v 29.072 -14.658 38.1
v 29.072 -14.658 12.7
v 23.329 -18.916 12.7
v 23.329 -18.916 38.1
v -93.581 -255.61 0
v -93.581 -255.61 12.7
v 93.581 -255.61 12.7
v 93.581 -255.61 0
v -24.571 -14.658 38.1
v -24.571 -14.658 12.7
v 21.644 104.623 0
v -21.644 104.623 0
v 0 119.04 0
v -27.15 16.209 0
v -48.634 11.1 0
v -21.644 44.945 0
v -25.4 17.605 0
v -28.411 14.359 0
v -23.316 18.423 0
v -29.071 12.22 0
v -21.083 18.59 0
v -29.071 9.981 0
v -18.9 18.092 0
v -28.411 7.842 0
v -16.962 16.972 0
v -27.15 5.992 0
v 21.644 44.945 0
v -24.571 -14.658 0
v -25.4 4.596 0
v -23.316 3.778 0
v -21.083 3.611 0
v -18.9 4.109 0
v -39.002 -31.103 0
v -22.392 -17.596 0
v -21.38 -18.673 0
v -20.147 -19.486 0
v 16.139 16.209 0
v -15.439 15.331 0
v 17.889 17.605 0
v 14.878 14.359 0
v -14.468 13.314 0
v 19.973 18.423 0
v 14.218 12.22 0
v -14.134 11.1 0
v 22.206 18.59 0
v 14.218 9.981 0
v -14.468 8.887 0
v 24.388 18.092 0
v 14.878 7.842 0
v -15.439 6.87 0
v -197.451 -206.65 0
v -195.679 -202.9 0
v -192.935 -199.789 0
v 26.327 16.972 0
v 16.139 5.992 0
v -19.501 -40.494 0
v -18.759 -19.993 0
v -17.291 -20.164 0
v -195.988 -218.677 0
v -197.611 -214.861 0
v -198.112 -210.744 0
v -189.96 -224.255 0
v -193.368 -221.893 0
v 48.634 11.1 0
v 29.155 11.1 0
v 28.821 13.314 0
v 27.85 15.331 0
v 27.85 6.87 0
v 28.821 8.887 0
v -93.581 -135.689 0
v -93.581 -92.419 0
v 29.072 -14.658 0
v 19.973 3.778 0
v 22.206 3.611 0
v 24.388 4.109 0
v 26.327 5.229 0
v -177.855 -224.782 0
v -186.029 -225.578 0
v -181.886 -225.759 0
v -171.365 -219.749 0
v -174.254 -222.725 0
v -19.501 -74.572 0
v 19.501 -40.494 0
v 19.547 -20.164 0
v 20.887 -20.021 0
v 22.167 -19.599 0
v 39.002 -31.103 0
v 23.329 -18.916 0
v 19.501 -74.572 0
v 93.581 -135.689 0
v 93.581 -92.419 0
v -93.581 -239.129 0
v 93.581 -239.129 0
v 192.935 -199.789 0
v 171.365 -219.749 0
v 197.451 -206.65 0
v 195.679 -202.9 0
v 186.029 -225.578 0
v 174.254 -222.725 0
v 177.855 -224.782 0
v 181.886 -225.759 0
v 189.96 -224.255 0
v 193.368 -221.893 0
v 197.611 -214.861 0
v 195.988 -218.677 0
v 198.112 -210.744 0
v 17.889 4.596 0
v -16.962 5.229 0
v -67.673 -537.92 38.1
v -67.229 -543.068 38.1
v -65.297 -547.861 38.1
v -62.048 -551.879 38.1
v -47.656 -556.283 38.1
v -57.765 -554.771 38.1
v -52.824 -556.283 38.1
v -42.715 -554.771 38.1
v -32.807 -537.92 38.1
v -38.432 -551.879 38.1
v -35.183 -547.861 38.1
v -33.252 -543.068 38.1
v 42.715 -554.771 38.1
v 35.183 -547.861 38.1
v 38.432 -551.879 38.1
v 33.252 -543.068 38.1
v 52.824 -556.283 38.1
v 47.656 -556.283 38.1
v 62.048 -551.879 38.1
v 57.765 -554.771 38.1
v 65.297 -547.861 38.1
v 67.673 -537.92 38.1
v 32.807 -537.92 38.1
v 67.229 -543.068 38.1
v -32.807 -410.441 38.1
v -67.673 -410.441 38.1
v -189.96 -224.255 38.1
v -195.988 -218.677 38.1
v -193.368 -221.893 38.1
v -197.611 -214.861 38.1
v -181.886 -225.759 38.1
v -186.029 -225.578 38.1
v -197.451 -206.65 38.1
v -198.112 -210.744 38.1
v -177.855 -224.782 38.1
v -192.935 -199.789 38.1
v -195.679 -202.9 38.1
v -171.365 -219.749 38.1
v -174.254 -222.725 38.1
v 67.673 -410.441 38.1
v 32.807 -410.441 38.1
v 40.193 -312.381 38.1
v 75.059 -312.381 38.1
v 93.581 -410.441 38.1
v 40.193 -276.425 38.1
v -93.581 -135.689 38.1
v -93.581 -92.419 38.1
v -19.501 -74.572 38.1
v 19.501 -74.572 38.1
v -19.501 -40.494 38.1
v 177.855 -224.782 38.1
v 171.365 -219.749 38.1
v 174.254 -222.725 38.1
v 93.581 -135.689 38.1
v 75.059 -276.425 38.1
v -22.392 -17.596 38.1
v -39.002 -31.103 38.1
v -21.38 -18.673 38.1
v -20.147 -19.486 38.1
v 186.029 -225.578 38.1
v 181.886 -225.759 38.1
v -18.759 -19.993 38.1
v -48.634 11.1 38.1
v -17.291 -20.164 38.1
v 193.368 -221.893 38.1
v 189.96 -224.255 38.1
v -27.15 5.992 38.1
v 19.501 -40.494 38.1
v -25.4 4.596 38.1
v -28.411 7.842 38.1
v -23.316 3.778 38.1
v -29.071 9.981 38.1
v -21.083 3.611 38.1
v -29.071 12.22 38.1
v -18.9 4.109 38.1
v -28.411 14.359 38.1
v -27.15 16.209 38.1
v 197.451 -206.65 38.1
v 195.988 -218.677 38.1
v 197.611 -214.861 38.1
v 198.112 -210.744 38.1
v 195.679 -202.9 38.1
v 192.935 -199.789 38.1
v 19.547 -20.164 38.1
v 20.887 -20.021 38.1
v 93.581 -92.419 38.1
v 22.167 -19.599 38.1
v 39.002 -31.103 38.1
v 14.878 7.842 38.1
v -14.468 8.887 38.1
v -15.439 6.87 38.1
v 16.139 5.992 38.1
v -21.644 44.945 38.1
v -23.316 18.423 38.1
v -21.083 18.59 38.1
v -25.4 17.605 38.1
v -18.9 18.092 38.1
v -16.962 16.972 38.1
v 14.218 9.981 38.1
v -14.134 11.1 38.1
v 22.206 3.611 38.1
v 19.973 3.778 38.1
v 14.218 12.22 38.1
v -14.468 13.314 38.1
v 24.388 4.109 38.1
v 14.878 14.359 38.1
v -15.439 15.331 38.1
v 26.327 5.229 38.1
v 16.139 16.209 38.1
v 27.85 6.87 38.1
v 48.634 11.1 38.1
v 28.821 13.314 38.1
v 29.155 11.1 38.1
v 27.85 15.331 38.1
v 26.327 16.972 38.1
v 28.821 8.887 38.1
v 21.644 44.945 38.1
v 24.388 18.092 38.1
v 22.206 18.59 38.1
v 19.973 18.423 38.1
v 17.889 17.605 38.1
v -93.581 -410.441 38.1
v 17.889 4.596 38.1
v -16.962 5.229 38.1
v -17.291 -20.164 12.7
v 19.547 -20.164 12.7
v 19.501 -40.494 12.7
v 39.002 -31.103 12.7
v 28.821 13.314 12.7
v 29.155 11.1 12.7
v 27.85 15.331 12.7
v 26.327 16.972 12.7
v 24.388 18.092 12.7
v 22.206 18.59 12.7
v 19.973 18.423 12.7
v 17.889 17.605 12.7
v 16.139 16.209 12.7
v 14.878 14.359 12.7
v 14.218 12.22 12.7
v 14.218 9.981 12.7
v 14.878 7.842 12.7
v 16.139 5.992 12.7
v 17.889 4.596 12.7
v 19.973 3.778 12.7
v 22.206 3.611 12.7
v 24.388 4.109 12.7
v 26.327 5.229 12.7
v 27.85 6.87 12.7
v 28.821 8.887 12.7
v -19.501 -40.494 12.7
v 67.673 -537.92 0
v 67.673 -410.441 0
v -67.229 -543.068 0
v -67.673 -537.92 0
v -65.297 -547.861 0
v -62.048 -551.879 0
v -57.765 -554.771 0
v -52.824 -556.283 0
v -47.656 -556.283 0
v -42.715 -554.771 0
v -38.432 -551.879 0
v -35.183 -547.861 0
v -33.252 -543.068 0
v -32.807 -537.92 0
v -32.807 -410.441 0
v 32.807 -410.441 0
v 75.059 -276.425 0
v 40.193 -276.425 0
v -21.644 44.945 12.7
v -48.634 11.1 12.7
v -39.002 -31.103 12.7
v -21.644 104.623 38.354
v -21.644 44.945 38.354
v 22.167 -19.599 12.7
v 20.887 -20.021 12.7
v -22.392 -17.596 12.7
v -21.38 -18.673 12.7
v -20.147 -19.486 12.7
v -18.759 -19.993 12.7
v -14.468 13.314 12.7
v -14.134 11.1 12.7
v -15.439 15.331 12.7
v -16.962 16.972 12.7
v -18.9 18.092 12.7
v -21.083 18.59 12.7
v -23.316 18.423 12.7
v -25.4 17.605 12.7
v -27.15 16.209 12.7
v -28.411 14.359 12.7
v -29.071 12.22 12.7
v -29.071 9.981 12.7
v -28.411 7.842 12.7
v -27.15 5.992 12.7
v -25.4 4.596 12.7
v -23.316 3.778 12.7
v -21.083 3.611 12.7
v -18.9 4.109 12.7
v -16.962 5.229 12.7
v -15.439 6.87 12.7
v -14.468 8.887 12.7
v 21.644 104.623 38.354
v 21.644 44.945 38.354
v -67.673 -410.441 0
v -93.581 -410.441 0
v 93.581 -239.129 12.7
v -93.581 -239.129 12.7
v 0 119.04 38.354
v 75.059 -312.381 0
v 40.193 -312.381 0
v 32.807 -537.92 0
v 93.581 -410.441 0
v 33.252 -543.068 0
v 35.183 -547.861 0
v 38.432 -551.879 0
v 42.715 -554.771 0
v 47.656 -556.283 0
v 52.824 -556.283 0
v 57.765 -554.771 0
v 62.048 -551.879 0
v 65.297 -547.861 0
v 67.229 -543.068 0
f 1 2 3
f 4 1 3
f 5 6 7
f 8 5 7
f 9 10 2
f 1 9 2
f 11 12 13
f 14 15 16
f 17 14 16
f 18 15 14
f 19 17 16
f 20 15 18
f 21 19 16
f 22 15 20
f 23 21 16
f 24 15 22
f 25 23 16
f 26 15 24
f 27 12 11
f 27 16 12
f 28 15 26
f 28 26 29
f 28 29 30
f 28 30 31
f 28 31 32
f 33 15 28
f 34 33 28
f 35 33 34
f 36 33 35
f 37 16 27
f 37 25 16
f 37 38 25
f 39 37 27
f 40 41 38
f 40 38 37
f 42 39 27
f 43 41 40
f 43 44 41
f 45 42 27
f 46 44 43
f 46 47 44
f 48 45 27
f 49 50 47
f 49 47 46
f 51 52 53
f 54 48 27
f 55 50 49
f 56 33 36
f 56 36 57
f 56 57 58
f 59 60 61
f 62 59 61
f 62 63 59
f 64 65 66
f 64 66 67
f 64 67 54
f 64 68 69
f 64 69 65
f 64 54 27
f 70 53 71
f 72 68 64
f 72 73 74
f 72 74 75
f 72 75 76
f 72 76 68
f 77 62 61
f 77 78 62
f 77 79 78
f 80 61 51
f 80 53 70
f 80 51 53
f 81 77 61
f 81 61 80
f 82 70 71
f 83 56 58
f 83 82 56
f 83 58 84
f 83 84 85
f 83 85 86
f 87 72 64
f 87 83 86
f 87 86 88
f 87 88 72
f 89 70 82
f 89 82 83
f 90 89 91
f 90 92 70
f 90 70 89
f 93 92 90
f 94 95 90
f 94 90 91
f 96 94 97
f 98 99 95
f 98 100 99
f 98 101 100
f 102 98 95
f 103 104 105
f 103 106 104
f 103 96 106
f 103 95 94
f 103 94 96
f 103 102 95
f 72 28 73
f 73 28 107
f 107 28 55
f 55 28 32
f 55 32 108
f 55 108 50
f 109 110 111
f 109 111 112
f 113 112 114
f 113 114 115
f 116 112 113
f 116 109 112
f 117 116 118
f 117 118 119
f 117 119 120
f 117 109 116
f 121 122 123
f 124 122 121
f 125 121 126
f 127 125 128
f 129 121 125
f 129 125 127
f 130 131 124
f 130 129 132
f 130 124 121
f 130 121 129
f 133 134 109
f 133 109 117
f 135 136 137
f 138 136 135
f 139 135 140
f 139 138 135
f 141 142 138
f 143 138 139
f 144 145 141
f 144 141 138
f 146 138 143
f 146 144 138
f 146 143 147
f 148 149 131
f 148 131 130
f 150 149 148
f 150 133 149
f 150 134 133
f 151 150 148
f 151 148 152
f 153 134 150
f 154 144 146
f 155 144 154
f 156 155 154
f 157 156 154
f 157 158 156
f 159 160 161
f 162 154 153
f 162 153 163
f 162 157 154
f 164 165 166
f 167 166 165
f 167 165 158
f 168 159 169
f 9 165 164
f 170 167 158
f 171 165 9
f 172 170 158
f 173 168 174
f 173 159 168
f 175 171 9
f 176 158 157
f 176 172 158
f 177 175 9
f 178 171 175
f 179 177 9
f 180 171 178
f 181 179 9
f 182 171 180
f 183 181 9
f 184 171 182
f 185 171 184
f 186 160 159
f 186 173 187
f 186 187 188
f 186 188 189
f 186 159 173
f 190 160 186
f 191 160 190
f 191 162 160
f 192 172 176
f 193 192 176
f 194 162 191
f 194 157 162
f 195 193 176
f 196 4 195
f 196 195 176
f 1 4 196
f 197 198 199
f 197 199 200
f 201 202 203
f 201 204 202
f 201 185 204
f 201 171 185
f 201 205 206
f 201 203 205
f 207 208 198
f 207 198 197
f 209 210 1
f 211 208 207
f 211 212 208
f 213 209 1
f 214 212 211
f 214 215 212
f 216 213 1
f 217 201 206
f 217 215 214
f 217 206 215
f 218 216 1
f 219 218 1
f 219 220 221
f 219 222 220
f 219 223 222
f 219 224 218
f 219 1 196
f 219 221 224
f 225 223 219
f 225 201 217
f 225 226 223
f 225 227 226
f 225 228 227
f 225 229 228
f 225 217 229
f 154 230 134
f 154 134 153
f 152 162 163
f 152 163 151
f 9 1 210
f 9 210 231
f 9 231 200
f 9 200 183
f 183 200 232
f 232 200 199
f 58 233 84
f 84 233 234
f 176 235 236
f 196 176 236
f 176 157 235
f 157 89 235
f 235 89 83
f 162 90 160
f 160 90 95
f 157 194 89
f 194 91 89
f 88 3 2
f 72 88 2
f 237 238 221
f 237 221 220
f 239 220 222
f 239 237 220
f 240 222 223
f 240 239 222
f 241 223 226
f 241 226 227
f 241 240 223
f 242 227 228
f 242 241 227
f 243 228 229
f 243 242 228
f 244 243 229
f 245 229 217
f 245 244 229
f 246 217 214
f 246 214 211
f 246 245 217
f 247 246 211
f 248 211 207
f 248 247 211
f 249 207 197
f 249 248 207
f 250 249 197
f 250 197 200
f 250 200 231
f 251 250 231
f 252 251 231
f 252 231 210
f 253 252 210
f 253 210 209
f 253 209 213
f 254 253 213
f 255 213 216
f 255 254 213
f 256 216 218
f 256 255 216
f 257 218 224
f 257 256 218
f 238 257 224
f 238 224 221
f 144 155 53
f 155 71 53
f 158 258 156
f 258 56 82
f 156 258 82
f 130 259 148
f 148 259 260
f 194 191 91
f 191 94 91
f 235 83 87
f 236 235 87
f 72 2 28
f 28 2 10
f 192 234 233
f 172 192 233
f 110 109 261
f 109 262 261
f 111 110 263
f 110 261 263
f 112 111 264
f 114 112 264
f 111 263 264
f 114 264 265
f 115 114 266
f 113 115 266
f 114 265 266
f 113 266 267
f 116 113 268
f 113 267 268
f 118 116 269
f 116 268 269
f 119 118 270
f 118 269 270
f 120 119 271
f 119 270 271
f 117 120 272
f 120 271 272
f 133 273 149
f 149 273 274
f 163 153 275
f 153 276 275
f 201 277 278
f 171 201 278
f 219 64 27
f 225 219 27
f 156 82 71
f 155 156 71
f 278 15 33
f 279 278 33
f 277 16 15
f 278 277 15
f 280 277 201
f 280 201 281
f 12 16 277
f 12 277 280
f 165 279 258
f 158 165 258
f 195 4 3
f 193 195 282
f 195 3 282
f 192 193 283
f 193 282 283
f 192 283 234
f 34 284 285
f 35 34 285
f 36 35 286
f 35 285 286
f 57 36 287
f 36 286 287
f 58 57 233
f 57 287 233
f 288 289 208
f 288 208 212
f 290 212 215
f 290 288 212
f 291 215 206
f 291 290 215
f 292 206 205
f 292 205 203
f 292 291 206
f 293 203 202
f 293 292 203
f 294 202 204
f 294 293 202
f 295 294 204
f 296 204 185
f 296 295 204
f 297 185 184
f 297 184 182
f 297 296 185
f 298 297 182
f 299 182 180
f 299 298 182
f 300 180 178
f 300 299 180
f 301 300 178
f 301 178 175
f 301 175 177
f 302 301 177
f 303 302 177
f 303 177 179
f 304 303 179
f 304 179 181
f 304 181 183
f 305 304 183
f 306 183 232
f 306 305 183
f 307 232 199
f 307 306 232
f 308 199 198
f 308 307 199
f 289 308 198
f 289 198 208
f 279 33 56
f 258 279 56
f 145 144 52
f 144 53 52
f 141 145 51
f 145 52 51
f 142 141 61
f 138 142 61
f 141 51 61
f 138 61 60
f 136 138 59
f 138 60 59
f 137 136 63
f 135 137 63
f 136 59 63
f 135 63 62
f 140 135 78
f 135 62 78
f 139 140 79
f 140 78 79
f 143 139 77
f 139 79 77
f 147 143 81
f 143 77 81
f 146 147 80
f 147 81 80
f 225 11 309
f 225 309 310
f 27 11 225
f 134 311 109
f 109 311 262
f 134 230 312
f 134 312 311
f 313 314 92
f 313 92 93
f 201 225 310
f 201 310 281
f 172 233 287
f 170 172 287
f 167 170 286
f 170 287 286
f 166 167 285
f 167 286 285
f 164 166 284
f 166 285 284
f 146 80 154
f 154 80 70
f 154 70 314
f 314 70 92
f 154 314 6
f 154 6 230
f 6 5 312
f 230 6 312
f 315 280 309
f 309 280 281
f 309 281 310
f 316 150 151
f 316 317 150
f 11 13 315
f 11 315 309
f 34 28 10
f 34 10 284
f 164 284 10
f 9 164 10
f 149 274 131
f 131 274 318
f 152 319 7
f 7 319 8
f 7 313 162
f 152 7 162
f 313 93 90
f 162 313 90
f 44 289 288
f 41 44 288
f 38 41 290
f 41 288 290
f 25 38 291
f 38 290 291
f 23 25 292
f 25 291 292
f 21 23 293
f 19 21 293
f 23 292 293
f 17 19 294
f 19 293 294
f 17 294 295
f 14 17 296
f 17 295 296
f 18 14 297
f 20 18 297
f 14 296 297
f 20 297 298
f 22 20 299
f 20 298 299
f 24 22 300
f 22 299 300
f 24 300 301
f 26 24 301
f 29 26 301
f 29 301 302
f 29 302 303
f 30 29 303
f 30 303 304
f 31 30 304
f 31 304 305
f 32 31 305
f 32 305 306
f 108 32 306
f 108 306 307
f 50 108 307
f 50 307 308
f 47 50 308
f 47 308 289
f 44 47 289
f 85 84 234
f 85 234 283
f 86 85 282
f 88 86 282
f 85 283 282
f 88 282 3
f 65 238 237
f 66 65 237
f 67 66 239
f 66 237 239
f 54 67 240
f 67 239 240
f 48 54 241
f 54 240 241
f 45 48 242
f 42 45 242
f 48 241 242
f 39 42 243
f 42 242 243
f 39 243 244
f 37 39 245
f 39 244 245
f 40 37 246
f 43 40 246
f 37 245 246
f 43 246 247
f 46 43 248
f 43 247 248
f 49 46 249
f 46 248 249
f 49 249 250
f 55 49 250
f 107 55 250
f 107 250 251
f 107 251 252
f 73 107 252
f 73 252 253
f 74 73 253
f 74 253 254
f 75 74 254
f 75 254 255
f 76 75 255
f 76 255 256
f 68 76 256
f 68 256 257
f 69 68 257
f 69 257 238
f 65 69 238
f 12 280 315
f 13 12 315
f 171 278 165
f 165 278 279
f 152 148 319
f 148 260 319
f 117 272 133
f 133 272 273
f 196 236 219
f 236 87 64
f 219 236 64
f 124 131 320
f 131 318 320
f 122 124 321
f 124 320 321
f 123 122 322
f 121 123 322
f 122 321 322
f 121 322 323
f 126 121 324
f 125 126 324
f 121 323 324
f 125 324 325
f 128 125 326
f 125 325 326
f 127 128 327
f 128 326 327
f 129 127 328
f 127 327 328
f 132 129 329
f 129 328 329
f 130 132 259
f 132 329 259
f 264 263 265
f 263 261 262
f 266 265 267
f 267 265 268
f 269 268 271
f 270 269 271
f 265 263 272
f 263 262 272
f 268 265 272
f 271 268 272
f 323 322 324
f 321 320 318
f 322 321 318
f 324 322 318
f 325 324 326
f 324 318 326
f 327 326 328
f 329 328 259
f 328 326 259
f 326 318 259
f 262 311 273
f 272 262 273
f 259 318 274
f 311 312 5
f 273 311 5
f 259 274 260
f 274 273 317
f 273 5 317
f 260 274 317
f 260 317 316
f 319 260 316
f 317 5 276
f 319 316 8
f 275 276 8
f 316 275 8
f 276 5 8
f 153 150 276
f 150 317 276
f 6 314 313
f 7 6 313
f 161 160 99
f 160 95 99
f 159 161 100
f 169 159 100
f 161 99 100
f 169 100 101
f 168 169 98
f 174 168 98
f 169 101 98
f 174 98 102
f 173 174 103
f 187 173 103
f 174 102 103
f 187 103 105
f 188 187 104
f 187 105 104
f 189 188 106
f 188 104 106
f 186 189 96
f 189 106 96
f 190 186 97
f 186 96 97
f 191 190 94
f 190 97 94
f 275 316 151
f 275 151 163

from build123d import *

# Parameters (mm, degrees)
F1_DEPTH  = 12.7
F2_R      = 7.5104207728
F3_DEPTH  = 12.701
F4_W      = 187.1625185013
F4_H      = 16.4809370326
F4_W_2    = 34.8658077419
F4_H_2    = 35.9553694725
F5_DEPTH  = 12.7
F5_FACE_R = 7.5104207728
F5_FACE_W = 34.8658077419
F5_FACE_H = 35.9553694725
F6_DEPTH  = 25.4
F7_DEPTH  = 12.7
F9_DEPTH  = 38.354


with BuildPart() as f1:
    # F0 (on Top) → F1 (new body)
    with BuildSketch(Plane.XY):
        Polygon((21.6443181937, 44.9448898435), (-21.6443181937, 44.9448898435), (-48.6343415176, 11.1004710827), (-39.001713719, -31.1028288117), (0, -49.8850642288), (39.001713719, -31.1028288117), (48.6343415176, 11.1004710827), align=None)
    extrude(amount=F1_DEPTH)

    # F2 (on face) → F3 (cut, through all)
    with BuildSketch(Plane.XY.offset(12.7)):
        with Locations((-21.6443181937, 11.1004710827)):
            Circle(F2_R)
        with Locations((21.6443181937, 11.1004710827)):
            Circle(F2_R)
        with BuildLine():
            ThreePointArc((-22.3923972439, -17.5961239861), (-20.1468702335, -19.4861496183), (-17.2912654826, -20.1644636691))
            Line((-17.2912654826, -20.1644636691), (19.5472728087, -20.1644636691))
            ThreePointArc((19.5472728087, -20.1644636691), (21.5385429204, -19.8441687483), (23.3289331258, -18.9155954304))
            Line((23.3289331258, -18.9155954304), (29.0724616498, -14.657702297))
            Line((29.0724616498, -14.657702297), (-24.5707594616, -14.657702297))
            Line((-24.5707594616, -14.657702297), (-22.3923972439, -17.5961239861))
        make_face()
    extrude(amount=-F3_DEPTH, mode=Mode.SUBTRACT)

    # F4 (on face) → F5 (join)
    with BuildSketch(Plane.XY.offset(12.7)):
        with BuildLine():
            Line((56.5410580551, -83.4953508641), (19.5008568595, -74.5715907042))
            Line((19.5008568595, -74.5715907042), (-19.5008568595, -74.5715907042))
            Line((-19.5008568595, -74.5715907042), (-56.5410580551, -83.4953508641))
            add(Edge.make_bspline(
                [(-56.5410580551, -83.4953508641), (-37.4583826818, -107.754176934), (0, -155.2743553327), (37.4583826818, -107.754176934), (56.5410580551, -83.4953508641)],
                knots=[0, 0, 0, 0, 0.5, 1, 1, 1, 1], degree=3))
        make_face()
        with BuildLine():
            Line((93.5812592506, -92.419111024), (56.5410580551, -83.4953508641))
            add(Edge.make_bspline(
                [(-56.5410580551, -83.4953508641), (-37.4583826818, -107.754176934), (0, -155.2743553327), (37.4583826818, -107.754176934), (56.5410580551, -83.4953508641)],
                knots=[0, 0, 0, 0, 0.5, 1, 1, 1, 1], degree=3))
            Line((-56.5410580551, -83.4953508641), (-93.5812592506, -92.419111024))
            Line((-93.5812592506, -92.419111024), (-93.5812592506, -135.6894243062))
            Line((-93.5812592506, -135.6894243062), (-93.5812592506, -239.1290962696))
            Line((-93.5812592506, -239.1290962696), (93.5812592506, -239.1290962696))
            Line((93.5812592506, -239.1290962696), (93.5812592506, -135.6894243062))
            Line((93.5812592506, -135.6894243062), (93.5812592506, -92.419111024))
        make_face()
        with BuildLine():
            Line((192.9354845729, -199.789452925), (93.5812592506, -92.419111024))
            Line((93.5812592506, -92.419111024), (93.5812592506, -135.6894243062))
            Line((93.5812592506, -135.6894243062), (171.3652932207, -219.7492445575))
            ThreePointArc((171.3652932207, -219.7492445575), (193.3684597033, -221.8925180787), (192.9354845729, -199.789452925))
        make_face()
        with BuildLine():
            Line((-93.5812592506, -135.6894243062), (-93.5812592506, -92.419111024))
            Line((-93.5812592506, -92.419111024), (-192.9354845729, -199.789452925))
            ThreePointArc((-192.9354845729, -199.789452925), (-193.3684597033, -221.8925180787), (-171.3652932207, -219.7492445575))
            Line((-171.3652932207, -219.7492445575), (-93.5812592506, -135.6894243062))
        make_face()
        with Locations((0, -247.3695647859)):
            Rectangle(F4_W, F4_H)
        Polygon((93.5812592506, -410.4407429695), (93.5812592506, -255.6100333022), (-93.5812592506, -255.6100333022), (-93.5812592506, -410.4407429695), (-67.6731318235, -410.4407429695), (-32.8073054552, -410.4407429695), (0, -410.4407429695), (32.8073054552, -410.4407429695), (67.6731318235, -410.4407429695), align=None)
        with Locations((57.6258767396, -294.4029867649)):
            Rectangle(F4_W_2, F4_H_2, mode=Mode.SUBTRACT)
        with BuildLine():
            Line((67.6731318235, -537.919596071), (67.6731318235, -410.4407429695))
            Line((67.6731318235, -410.4407429695), (32.8073054552, -410.4407429695))
            Line((32.8073054552, -410.4407429695), (32.8073054552, -537.919596071))
            ThreePointArc((32.8073054552, -537.919596071), (50.2402186394, -556.4753226857), (67.6731318235, -537.919596071))
        make_face()
        with BuildLine():
            Line((-32.8073054552, -410.4407429695), (-67.6731318235, -410.4407429695))
            Line((-67.6731318235, -410.4407429695), (-67.6731318235, -537.919596071))
            ThreePointArc((-67.6731318235, -537.919596071), (-50.2402186394, -556.4753226857), (-32.8073054552, -537.919596071))
            Line((-32.8073054552, -537.919596071), (-32.8073054552, -410.4407429695))
        make_face()
        Polygon((0, -49.8850642288), (-19.5008568595, -40.4939465203), (-19.5008568595, -74.5715907042), (19.5008568595, -74.5715907042), (19.5008568595, -40.4939465203), align=None)
    extrude(amount=-F5_DEPTH)

    # F4 (on face) + F5_face (on face) → F6 (join)
    with BuildSketch(Plane.XY.offset(12.7)):
        with BuildLine():
            Line((56.5410580551, -83.4953508641), (19.5008568595, -74.5715907042))
            Line((19.5008568595, -74.5715907042), (-19.5008568595, -74.5715907042))
            Line((-19.5008568595, -74.5715907042), (-56.5410580551, -83.4953508641))
            add(Edge.make_bspline(
                [(-56.5410580551, -83.4953508641), (-37.4583826818, -107.754176934), (0, -155.2743553327), (37.4583826818, -107.754176934), (56.5410580551, -83.4953508641)],
                knots=[0, 0, 0, 0, 0.5, 1, 1, 1, 1], degree=3))
        make_face()
        with BuildLine():
            Line((93.5812592506, -92.419111024), (56.5410580551, -83.4953508641))
            add(Edge.make_bspline(
                [(-56.5410580551, -83.4953508641), (-37.4583826818, -107.754176934), (0, -155.2743553327), (37.4583826818, -107.754176934), (56.5410580551, -83.4953508641)],
                knots=[0, 0, 0, 0, 0.5, 1, 1, 1, 1], degree=3))
            Line((-56.5410580551, -83.4953508641), (-93.5812592506, -92.419111024))
            Line((-93.5812592506, -92.419111024), (-93.5812592506, -135.6894243062))
            Line((-93.5812592506, -135.6894243062), (-93.5812592506, -239.1290962696))
            Line((-93.5812592506, -239.1290962696), (93.5812592506, -239.1290962696))
            Line((93.5812592506, -239.1290962696), (93.5812592506, -135.6894243062))
            Line((93.5812592506, -135.6894243062), (93.5812592506, -92.419111024))
        make_face()
        with BuildLine():
            Line((192.9354845729, -199.789452925), (93.5812592506, -92.419111024))
            Line((93.5812592506, -92.419111024), (93.5812592506, -135.6894243062))
            Line((93.5812592506, -135.6894243062), (171.3652932207, -219.7492445575))
            ThreePointArc((171.3652932207, -219.7492445575), (193.3684597033, -221.8925180787), (192.9354845729, -199.789452925))
        make_face()
        with BuildLine():
            Line((-93.5812592506, -135.6894243062), (-93.5812592506, -92.419111024))
            Line((-93.5812592506, -92.419111024), (-192.9354845729, -199.789452925))
            ThreePointArc((-192.9354845729, -199.789452925), (-193.3684597033, -221.8925180787), (-171.3652932207, -219.7492445575))
            Line((-171.3652932207, -219.7492445575), (-93.5812592506, -135.6894243062))
        make_face()
        with Locations((0, -247.3695647859)):
            Rectangle(F4_W, F4_H)
        Polygon((93.5812592506, -410.4407429695), (93.5812592506, -255.6100333022), (-93.5812592506, -255.6100333022), (-93.5812592506, -410.4407429695), (-67.6731318235, -410.4407429695), (-32.8073054552, -410.4407429695), (0, -410.4407429695), (32.8073054552, -410.4407429695), (67.6731318235, -410.4407429695), align=None)
        with Locations((57.6258767396, -294.4029867649)):
            Rectangle(F4_W_2, F4_H_2, mode=Mode.SUBTRACT)
        with BuildLine():
            Line((67.6731318235, -537.919596071), (67.6731318235, -410.4407429695))
            Line((67.6731318235, -410.4407429695), (32.8073054552, -410.4407429695))
            Line((32.8073054552, -410.4407429695), (32.8073054552, -537.919596071))
            ThreePointArc((32.8073054552, -537.919596071), (50.2402186394, -556.4753226857), (67.6731318235, -537.919596071))
        make_face()
        with BuildLine():
            Line((-32.8073054552, -410.4407429695), (-67.6731318235, -410.4407429695))
            Line((-67.6731318235, -410.4407429695), (-67.6731318235, -537.919596071))
            ThreePointArc((-67.6731318235, -537.919596071), (-50.2402186394, -556.4753226857), (-32.8073054552, -537.919596071))
            Line((-32.8073054552, -537.919596071), (-32.8073054552, -410.4407429695))
        make_face()
    with BuildSketch(Plane(origin=(-0.8446468995, -244.4359717848, 12.7), x_dir=(1, 0, 0), z_dir=(0, 0, 1))):
        with BuildLine():
            Line((22.4889650932, 289.3808616283), (-20.7996712942, 289.3808616283))
            Line((-20.7996712942, 289.3808616283), (-47.7896946182, 255.5364428675))
            Line((-47.7896946182, 255.5364428675), (-38.1570668195, 213.3331429731))
            Line((-38.1570668195, 213.3331429731), (-18.65620996, 203.9420252645))
            Line((-18.65620996, 203.9420252645), (-18.65620996, 169.8643810806))
            Line((-18.65620996, 169.8643810806), (-92.7366123512, 152.0168607608))
            Line((-92.7366123512, 152.0168607608), (-192.0908376734, 44.6465188598))
            ThreePointArc((-192.0908376734, 44.6465188598), (-192.5238128038, 22.5434537061), (-170.5206463212, 24.6867272273))
            Line((-170.5206463212, 24.6867272273), (-92.7366123512, 108.7465474786))
            Line((-92.7366123512, 108.7465474786), (-92.7366123512, -166.0047711847))
            Line((-92.7366123512, -166.0047711847), (-66.8284849241, -166.0047711847))
            Line((-66.8284849241, -166.0047711847), (-66.8284849241, -293.4836242862))
            ThreePointArc((-66.8284849241, -293.4836242862), (-49.3955717399, -312.0393509009), (-31.9626585557, -293.4836242862))
            Line((-31.9626585557, -293.4836242862), (-31.9626585557, -166.0047711847))
            Line((-31.9626585557, -166.0047711847), (33.6519523547, -166.0047711847))
            Line((33.6519523547, -166.0047711847), (33.6519523547, -293.4836242862))
            ThreePointArc((33.6519523547, -293.4836242862), (51.0848655389, -312.0393509009), (68.517778723, -293.4836242862))
            Line((68.517778723, -293.4836242862), (68.517778723, -166.0047711847))
            Line((68.517778723, -166.0047711847), (94.4259061501, -166.0047711847))
            Line((94.4259061501, -166.0047711847), (94.4259061501, 108.7465474786))
            Line((94.4259061501, 108.7465474786), (172.2099401201, 24.6867272273))
            ThreePointArc((172.2099401201, 24.6867272273), (194.2131066028, 22.5434537061), (193.7801314724, 44.6465188598))
            Line((193.7801314724, 44.6465188598), (94.4259061501, 152.0168607608))
            Line((94.4259061501, 152.0168607608), (20.345503759, 169.8643810806))
            Line((20.345503759, 169.8643810806), (20.345503759, 203.9420252645))
            Line((20.345503759, 203.9420252645), (39.8463606185, 213.3331429731))
            Line((39.8463606185, 213.3331429731), (49.4789884171, 255.5364428675))
            Line((49.4789884171, 255.5364428675), (22.4889650932, 289.3808616283))
        make_face()
        with BuildLine():
            Line((-21.5477503444, 226.8398477987), (-23.7261125621, 229.7782694878))
            Line((-23.7261125621, 229.7782694878), (29.9171085493, 229.7782694878))
            Line((29.9171085493, 229.7782694878), (24.1735800252, 225.5203763544))
            ThreePointArc((24.1735800252, 225.5203763544), (22.3831898199, 224.5918030365), (20.3919197082, 224.2715081157))
            Line((20.3919197082, 224.2715081157), (-16.4466185831, 224.2715081157))
            ThreePointArc((-16.4466185831, 224.2715081157), (-19.302223334, 224.9498221665), (-21.5477503444, 226.8398477987))
        make_face(mode=Mode.SUBTRACT)
        with Locations((-20.7996712942, 255.5364428675)):
            Circle(F5_FACE_R, mode=Mode.SUBTRACT)
        with Locations((22.4889650932, 255.5364428675)):
            Circle(F5_FACE_R, mode=Mode.SUBTRACT)
        with Locations((58.4705236391, -49.9670149801)):
            Rectangle(F5_FACE_W, F5_FACE_H, mode=Mode.SUBTRACT)
    extrude(amount=F6_DEPTH)

    # F4 (on face) → F7 (cut)
    with BuildSketch(Plane.XY.offset(12.7)):
        with Locations((0, -247.3695647859)):
            Rectangle(F4_W, F4_H)
    extrude(amount=-F7_DEPTH, mode=Mode.SUBTRACT)

    # F8 (on face) → F9 (join)
    with BuildSketch(Plane(origin=(0, 0, 0), x_dir=(1, 0, 0), z_dir=(0, 0, -1))):
        Polygon((21.6443181937, -104.6233549714), (21.6443181937, -44.9448898435), (-21.6443181937, -44.9448898435), (-21.6443181937, -104.6233549714), (0, -119.0398335457), align=None)
    extrude(amount=-F9_DEPTH)


solid = f1.part
